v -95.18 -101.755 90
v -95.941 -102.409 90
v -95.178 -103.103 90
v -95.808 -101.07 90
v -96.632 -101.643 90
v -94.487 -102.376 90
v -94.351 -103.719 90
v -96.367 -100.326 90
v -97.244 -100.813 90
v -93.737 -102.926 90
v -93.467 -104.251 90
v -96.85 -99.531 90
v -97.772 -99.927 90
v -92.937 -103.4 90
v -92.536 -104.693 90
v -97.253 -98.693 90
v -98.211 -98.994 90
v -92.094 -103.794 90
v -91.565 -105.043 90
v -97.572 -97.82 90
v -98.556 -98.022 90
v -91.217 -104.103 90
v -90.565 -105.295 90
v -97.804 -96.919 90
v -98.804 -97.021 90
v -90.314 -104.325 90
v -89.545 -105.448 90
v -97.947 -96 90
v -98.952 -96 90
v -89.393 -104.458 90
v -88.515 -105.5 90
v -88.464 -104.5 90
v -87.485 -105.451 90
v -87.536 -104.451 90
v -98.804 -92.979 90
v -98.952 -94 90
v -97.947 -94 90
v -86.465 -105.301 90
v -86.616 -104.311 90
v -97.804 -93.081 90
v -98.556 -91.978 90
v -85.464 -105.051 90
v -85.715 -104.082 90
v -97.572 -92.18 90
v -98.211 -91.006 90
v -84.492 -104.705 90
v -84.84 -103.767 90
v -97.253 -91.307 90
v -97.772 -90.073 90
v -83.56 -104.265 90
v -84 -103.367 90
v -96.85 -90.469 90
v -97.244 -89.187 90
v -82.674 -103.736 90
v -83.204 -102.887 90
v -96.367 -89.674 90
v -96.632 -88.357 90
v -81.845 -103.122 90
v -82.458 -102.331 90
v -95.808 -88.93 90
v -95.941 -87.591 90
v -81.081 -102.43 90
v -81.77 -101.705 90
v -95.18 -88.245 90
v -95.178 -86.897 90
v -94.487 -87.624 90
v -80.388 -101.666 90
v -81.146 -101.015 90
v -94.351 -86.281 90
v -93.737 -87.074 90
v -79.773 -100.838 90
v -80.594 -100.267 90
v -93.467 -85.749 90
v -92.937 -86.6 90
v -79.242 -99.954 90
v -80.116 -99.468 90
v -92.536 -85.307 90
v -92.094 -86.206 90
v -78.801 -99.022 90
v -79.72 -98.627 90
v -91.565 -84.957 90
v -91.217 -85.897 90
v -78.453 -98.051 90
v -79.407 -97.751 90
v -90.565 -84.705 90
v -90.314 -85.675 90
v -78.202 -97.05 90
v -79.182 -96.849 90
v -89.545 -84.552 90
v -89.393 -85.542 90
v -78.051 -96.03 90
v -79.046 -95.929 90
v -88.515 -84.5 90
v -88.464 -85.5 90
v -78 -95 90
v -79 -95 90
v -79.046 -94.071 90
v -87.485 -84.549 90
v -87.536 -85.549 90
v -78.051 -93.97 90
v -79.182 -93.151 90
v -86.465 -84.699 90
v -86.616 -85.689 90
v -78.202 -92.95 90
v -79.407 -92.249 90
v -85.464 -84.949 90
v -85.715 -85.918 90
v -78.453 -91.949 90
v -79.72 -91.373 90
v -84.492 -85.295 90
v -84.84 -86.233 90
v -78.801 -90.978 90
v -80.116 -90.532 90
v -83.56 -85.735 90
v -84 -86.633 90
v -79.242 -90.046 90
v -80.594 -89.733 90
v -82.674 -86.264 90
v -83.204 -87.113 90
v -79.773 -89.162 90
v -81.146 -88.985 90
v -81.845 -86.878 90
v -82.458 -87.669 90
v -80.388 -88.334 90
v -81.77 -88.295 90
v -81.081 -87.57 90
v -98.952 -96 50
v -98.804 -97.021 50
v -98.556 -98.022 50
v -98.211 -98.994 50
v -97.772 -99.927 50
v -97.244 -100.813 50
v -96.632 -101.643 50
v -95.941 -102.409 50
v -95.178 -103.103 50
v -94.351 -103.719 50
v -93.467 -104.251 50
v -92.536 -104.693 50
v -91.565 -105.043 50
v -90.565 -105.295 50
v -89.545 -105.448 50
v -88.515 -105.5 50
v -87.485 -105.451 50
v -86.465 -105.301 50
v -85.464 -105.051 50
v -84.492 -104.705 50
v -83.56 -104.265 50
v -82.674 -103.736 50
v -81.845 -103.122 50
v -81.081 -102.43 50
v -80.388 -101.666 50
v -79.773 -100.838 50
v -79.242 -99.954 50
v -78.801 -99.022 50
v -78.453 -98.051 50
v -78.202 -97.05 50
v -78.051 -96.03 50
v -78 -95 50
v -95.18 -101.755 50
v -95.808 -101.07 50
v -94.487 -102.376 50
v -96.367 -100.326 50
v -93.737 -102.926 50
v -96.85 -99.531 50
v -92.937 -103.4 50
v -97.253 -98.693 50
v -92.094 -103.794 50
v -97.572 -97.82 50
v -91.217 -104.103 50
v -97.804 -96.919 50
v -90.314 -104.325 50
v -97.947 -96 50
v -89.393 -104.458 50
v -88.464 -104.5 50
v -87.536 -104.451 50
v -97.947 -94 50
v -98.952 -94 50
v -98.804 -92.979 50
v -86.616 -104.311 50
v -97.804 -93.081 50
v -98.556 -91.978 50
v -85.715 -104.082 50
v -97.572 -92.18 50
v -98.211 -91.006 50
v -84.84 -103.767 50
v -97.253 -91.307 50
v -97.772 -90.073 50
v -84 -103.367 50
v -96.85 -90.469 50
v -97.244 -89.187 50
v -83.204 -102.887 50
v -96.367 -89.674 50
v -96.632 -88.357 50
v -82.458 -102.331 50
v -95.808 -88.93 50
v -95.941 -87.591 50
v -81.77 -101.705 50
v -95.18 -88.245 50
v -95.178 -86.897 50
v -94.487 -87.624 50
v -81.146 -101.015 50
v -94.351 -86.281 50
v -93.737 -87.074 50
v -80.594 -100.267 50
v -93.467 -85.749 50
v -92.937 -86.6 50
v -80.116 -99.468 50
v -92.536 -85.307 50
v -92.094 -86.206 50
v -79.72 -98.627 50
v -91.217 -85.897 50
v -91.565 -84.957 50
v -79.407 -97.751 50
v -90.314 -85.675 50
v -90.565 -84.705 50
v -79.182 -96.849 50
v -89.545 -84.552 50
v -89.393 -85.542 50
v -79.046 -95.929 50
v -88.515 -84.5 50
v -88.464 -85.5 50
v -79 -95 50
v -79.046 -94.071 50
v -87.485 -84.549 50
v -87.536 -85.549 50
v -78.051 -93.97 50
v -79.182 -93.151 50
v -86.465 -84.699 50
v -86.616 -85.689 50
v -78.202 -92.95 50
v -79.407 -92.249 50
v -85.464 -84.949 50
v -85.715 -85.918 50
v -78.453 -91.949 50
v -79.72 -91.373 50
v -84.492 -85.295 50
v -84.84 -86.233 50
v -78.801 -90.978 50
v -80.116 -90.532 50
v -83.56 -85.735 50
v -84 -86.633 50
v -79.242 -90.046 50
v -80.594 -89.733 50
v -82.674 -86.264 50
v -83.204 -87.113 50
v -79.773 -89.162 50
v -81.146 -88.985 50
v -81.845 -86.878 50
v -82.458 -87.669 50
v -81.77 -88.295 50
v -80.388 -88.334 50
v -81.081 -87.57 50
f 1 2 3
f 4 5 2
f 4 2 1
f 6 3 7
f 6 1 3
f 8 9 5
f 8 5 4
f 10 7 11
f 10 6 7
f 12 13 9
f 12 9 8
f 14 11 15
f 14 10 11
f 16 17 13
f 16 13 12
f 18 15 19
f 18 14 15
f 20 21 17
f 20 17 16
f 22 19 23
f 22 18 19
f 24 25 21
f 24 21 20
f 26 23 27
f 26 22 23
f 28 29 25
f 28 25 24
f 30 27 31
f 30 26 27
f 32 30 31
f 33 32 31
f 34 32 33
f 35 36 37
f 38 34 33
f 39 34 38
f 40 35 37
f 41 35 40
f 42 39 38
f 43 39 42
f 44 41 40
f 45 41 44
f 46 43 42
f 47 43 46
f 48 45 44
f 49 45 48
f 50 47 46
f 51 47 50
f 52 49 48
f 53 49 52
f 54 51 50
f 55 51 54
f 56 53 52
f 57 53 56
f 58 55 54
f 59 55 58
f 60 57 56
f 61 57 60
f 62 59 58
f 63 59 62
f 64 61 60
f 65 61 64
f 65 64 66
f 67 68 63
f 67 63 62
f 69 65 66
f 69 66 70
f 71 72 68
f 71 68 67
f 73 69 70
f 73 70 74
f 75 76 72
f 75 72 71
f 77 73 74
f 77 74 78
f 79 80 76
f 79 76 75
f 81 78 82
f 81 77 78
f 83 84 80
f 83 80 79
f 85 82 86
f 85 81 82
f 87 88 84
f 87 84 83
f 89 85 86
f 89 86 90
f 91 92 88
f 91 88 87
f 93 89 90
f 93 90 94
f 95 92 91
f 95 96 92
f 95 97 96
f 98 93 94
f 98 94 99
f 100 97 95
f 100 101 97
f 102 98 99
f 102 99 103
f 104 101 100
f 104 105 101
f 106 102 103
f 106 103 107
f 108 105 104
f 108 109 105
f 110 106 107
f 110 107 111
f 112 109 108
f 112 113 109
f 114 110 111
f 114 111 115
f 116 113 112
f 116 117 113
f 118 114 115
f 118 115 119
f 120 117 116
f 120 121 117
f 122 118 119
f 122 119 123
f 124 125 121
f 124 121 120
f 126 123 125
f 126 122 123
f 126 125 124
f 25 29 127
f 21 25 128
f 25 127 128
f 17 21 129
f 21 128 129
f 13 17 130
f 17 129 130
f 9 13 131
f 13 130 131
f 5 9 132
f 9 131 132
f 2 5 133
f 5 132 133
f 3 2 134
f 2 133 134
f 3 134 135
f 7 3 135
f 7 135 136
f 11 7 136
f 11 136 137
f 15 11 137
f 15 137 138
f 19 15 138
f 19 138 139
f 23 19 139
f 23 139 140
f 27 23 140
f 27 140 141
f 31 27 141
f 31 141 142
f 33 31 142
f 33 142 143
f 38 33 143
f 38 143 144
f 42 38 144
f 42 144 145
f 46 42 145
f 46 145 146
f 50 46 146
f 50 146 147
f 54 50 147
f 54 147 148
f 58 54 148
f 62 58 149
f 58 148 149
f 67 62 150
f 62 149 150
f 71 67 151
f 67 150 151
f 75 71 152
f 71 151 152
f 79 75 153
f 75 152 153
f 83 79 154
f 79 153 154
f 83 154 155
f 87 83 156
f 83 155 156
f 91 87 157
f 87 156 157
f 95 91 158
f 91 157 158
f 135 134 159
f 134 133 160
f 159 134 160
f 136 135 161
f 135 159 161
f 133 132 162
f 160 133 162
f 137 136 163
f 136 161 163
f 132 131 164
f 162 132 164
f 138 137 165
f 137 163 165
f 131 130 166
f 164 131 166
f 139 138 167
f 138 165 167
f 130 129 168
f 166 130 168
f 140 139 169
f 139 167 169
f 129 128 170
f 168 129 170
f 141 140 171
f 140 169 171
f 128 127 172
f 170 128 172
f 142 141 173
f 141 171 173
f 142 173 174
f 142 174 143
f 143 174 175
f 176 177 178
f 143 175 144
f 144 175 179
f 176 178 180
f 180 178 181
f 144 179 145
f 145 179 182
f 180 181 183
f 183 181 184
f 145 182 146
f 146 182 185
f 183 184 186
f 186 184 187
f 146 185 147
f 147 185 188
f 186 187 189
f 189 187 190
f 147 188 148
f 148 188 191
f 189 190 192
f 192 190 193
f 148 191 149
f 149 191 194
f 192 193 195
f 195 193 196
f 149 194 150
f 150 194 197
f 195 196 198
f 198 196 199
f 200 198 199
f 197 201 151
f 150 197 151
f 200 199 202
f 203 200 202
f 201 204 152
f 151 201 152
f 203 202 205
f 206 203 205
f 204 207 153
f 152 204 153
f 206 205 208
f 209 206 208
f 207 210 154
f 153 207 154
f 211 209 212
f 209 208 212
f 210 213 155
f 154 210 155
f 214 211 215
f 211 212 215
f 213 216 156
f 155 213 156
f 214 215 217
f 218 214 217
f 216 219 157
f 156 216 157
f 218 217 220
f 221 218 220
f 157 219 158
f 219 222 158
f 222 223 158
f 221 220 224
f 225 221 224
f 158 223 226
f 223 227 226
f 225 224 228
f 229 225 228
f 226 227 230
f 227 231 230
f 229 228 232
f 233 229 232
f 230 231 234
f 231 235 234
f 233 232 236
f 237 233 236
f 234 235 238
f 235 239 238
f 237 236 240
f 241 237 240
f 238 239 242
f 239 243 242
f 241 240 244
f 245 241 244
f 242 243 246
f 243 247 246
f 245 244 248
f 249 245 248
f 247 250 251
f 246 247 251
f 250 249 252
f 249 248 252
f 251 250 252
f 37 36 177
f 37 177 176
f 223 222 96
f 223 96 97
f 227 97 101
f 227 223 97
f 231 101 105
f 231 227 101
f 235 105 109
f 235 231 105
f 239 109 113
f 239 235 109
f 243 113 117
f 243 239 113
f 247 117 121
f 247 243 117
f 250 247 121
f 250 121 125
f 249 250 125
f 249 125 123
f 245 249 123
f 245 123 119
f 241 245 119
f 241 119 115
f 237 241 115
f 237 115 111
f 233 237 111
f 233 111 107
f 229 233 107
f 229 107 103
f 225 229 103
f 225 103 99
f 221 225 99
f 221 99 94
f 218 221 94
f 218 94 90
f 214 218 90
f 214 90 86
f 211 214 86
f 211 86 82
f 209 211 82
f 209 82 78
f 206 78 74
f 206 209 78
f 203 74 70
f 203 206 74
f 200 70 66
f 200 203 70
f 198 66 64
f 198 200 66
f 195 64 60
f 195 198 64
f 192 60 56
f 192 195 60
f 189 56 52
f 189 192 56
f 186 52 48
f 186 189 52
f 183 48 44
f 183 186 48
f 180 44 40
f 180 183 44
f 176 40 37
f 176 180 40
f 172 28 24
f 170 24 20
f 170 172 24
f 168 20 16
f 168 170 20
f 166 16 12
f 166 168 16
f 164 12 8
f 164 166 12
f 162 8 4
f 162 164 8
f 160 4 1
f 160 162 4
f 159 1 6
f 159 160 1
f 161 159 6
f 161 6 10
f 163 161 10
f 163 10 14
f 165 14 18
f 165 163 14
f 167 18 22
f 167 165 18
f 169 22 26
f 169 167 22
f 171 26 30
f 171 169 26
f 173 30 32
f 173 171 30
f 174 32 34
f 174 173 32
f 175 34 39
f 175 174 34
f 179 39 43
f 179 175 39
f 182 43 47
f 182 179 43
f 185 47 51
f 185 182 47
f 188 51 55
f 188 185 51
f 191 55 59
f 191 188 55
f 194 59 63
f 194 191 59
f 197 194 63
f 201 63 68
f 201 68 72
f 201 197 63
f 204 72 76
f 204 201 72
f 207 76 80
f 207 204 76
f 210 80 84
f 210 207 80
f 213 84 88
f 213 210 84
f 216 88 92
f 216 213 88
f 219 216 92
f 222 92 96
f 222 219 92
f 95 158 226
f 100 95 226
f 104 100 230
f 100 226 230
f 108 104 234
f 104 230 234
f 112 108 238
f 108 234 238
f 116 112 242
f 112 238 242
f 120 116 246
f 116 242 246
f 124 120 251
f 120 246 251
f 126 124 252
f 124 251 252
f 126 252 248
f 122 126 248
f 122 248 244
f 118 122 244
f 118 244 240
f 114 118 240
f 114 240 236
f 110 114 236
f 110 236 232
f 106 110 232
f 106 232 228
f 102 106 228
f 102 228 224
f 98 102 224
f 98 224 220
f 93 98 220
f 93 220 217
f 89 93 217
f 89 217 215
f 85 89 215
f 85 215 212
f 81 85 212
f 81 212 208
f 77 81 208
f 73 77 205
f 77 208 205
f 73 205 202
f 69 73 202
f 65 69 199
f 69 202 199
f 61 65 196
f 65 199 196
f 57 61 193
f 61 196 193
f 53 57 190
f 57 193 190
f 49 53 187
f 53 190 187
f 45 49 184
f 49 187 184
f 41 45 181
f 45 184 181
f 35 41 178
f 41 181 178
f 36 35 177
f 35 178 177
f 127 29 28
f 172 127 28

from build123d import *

# Parameters (mm, degrees)
F0_R     = 10.5
F0_R_2   = 9.5
F1_DEPTH = 40
F2_W     = 5
F2_H     = 2
F3_DEPTH = 40.001


with BuildPart() as f1:
    # F0 (on Top) → F1 (new body)
    with BuildSketch(Plane.XY):
        with Locations((-88.5, -95)):
            Circle(F0_R)
        with Locations((-88.5, -95)):
            Circle(F0_R_2, mode=Mode.SUBTRACT)
    extrude(amount=F1_DEPTH)

    # F2 (on face) → F3 (cut, through all)
    with BuildSketch(Plane.XY.offset(40)):
        with Locations((-100.125511, -95)):
            Rectangle(F2_W, F2_H)
    extrude(amount=-F3_DEPTH, mode=Mode.SUBTRACT)


with BuildPart() as f1_1:
    # F4: moved
    add(f1.part.moved(Location((0, 0, 50))))


solid = f1_1.part
